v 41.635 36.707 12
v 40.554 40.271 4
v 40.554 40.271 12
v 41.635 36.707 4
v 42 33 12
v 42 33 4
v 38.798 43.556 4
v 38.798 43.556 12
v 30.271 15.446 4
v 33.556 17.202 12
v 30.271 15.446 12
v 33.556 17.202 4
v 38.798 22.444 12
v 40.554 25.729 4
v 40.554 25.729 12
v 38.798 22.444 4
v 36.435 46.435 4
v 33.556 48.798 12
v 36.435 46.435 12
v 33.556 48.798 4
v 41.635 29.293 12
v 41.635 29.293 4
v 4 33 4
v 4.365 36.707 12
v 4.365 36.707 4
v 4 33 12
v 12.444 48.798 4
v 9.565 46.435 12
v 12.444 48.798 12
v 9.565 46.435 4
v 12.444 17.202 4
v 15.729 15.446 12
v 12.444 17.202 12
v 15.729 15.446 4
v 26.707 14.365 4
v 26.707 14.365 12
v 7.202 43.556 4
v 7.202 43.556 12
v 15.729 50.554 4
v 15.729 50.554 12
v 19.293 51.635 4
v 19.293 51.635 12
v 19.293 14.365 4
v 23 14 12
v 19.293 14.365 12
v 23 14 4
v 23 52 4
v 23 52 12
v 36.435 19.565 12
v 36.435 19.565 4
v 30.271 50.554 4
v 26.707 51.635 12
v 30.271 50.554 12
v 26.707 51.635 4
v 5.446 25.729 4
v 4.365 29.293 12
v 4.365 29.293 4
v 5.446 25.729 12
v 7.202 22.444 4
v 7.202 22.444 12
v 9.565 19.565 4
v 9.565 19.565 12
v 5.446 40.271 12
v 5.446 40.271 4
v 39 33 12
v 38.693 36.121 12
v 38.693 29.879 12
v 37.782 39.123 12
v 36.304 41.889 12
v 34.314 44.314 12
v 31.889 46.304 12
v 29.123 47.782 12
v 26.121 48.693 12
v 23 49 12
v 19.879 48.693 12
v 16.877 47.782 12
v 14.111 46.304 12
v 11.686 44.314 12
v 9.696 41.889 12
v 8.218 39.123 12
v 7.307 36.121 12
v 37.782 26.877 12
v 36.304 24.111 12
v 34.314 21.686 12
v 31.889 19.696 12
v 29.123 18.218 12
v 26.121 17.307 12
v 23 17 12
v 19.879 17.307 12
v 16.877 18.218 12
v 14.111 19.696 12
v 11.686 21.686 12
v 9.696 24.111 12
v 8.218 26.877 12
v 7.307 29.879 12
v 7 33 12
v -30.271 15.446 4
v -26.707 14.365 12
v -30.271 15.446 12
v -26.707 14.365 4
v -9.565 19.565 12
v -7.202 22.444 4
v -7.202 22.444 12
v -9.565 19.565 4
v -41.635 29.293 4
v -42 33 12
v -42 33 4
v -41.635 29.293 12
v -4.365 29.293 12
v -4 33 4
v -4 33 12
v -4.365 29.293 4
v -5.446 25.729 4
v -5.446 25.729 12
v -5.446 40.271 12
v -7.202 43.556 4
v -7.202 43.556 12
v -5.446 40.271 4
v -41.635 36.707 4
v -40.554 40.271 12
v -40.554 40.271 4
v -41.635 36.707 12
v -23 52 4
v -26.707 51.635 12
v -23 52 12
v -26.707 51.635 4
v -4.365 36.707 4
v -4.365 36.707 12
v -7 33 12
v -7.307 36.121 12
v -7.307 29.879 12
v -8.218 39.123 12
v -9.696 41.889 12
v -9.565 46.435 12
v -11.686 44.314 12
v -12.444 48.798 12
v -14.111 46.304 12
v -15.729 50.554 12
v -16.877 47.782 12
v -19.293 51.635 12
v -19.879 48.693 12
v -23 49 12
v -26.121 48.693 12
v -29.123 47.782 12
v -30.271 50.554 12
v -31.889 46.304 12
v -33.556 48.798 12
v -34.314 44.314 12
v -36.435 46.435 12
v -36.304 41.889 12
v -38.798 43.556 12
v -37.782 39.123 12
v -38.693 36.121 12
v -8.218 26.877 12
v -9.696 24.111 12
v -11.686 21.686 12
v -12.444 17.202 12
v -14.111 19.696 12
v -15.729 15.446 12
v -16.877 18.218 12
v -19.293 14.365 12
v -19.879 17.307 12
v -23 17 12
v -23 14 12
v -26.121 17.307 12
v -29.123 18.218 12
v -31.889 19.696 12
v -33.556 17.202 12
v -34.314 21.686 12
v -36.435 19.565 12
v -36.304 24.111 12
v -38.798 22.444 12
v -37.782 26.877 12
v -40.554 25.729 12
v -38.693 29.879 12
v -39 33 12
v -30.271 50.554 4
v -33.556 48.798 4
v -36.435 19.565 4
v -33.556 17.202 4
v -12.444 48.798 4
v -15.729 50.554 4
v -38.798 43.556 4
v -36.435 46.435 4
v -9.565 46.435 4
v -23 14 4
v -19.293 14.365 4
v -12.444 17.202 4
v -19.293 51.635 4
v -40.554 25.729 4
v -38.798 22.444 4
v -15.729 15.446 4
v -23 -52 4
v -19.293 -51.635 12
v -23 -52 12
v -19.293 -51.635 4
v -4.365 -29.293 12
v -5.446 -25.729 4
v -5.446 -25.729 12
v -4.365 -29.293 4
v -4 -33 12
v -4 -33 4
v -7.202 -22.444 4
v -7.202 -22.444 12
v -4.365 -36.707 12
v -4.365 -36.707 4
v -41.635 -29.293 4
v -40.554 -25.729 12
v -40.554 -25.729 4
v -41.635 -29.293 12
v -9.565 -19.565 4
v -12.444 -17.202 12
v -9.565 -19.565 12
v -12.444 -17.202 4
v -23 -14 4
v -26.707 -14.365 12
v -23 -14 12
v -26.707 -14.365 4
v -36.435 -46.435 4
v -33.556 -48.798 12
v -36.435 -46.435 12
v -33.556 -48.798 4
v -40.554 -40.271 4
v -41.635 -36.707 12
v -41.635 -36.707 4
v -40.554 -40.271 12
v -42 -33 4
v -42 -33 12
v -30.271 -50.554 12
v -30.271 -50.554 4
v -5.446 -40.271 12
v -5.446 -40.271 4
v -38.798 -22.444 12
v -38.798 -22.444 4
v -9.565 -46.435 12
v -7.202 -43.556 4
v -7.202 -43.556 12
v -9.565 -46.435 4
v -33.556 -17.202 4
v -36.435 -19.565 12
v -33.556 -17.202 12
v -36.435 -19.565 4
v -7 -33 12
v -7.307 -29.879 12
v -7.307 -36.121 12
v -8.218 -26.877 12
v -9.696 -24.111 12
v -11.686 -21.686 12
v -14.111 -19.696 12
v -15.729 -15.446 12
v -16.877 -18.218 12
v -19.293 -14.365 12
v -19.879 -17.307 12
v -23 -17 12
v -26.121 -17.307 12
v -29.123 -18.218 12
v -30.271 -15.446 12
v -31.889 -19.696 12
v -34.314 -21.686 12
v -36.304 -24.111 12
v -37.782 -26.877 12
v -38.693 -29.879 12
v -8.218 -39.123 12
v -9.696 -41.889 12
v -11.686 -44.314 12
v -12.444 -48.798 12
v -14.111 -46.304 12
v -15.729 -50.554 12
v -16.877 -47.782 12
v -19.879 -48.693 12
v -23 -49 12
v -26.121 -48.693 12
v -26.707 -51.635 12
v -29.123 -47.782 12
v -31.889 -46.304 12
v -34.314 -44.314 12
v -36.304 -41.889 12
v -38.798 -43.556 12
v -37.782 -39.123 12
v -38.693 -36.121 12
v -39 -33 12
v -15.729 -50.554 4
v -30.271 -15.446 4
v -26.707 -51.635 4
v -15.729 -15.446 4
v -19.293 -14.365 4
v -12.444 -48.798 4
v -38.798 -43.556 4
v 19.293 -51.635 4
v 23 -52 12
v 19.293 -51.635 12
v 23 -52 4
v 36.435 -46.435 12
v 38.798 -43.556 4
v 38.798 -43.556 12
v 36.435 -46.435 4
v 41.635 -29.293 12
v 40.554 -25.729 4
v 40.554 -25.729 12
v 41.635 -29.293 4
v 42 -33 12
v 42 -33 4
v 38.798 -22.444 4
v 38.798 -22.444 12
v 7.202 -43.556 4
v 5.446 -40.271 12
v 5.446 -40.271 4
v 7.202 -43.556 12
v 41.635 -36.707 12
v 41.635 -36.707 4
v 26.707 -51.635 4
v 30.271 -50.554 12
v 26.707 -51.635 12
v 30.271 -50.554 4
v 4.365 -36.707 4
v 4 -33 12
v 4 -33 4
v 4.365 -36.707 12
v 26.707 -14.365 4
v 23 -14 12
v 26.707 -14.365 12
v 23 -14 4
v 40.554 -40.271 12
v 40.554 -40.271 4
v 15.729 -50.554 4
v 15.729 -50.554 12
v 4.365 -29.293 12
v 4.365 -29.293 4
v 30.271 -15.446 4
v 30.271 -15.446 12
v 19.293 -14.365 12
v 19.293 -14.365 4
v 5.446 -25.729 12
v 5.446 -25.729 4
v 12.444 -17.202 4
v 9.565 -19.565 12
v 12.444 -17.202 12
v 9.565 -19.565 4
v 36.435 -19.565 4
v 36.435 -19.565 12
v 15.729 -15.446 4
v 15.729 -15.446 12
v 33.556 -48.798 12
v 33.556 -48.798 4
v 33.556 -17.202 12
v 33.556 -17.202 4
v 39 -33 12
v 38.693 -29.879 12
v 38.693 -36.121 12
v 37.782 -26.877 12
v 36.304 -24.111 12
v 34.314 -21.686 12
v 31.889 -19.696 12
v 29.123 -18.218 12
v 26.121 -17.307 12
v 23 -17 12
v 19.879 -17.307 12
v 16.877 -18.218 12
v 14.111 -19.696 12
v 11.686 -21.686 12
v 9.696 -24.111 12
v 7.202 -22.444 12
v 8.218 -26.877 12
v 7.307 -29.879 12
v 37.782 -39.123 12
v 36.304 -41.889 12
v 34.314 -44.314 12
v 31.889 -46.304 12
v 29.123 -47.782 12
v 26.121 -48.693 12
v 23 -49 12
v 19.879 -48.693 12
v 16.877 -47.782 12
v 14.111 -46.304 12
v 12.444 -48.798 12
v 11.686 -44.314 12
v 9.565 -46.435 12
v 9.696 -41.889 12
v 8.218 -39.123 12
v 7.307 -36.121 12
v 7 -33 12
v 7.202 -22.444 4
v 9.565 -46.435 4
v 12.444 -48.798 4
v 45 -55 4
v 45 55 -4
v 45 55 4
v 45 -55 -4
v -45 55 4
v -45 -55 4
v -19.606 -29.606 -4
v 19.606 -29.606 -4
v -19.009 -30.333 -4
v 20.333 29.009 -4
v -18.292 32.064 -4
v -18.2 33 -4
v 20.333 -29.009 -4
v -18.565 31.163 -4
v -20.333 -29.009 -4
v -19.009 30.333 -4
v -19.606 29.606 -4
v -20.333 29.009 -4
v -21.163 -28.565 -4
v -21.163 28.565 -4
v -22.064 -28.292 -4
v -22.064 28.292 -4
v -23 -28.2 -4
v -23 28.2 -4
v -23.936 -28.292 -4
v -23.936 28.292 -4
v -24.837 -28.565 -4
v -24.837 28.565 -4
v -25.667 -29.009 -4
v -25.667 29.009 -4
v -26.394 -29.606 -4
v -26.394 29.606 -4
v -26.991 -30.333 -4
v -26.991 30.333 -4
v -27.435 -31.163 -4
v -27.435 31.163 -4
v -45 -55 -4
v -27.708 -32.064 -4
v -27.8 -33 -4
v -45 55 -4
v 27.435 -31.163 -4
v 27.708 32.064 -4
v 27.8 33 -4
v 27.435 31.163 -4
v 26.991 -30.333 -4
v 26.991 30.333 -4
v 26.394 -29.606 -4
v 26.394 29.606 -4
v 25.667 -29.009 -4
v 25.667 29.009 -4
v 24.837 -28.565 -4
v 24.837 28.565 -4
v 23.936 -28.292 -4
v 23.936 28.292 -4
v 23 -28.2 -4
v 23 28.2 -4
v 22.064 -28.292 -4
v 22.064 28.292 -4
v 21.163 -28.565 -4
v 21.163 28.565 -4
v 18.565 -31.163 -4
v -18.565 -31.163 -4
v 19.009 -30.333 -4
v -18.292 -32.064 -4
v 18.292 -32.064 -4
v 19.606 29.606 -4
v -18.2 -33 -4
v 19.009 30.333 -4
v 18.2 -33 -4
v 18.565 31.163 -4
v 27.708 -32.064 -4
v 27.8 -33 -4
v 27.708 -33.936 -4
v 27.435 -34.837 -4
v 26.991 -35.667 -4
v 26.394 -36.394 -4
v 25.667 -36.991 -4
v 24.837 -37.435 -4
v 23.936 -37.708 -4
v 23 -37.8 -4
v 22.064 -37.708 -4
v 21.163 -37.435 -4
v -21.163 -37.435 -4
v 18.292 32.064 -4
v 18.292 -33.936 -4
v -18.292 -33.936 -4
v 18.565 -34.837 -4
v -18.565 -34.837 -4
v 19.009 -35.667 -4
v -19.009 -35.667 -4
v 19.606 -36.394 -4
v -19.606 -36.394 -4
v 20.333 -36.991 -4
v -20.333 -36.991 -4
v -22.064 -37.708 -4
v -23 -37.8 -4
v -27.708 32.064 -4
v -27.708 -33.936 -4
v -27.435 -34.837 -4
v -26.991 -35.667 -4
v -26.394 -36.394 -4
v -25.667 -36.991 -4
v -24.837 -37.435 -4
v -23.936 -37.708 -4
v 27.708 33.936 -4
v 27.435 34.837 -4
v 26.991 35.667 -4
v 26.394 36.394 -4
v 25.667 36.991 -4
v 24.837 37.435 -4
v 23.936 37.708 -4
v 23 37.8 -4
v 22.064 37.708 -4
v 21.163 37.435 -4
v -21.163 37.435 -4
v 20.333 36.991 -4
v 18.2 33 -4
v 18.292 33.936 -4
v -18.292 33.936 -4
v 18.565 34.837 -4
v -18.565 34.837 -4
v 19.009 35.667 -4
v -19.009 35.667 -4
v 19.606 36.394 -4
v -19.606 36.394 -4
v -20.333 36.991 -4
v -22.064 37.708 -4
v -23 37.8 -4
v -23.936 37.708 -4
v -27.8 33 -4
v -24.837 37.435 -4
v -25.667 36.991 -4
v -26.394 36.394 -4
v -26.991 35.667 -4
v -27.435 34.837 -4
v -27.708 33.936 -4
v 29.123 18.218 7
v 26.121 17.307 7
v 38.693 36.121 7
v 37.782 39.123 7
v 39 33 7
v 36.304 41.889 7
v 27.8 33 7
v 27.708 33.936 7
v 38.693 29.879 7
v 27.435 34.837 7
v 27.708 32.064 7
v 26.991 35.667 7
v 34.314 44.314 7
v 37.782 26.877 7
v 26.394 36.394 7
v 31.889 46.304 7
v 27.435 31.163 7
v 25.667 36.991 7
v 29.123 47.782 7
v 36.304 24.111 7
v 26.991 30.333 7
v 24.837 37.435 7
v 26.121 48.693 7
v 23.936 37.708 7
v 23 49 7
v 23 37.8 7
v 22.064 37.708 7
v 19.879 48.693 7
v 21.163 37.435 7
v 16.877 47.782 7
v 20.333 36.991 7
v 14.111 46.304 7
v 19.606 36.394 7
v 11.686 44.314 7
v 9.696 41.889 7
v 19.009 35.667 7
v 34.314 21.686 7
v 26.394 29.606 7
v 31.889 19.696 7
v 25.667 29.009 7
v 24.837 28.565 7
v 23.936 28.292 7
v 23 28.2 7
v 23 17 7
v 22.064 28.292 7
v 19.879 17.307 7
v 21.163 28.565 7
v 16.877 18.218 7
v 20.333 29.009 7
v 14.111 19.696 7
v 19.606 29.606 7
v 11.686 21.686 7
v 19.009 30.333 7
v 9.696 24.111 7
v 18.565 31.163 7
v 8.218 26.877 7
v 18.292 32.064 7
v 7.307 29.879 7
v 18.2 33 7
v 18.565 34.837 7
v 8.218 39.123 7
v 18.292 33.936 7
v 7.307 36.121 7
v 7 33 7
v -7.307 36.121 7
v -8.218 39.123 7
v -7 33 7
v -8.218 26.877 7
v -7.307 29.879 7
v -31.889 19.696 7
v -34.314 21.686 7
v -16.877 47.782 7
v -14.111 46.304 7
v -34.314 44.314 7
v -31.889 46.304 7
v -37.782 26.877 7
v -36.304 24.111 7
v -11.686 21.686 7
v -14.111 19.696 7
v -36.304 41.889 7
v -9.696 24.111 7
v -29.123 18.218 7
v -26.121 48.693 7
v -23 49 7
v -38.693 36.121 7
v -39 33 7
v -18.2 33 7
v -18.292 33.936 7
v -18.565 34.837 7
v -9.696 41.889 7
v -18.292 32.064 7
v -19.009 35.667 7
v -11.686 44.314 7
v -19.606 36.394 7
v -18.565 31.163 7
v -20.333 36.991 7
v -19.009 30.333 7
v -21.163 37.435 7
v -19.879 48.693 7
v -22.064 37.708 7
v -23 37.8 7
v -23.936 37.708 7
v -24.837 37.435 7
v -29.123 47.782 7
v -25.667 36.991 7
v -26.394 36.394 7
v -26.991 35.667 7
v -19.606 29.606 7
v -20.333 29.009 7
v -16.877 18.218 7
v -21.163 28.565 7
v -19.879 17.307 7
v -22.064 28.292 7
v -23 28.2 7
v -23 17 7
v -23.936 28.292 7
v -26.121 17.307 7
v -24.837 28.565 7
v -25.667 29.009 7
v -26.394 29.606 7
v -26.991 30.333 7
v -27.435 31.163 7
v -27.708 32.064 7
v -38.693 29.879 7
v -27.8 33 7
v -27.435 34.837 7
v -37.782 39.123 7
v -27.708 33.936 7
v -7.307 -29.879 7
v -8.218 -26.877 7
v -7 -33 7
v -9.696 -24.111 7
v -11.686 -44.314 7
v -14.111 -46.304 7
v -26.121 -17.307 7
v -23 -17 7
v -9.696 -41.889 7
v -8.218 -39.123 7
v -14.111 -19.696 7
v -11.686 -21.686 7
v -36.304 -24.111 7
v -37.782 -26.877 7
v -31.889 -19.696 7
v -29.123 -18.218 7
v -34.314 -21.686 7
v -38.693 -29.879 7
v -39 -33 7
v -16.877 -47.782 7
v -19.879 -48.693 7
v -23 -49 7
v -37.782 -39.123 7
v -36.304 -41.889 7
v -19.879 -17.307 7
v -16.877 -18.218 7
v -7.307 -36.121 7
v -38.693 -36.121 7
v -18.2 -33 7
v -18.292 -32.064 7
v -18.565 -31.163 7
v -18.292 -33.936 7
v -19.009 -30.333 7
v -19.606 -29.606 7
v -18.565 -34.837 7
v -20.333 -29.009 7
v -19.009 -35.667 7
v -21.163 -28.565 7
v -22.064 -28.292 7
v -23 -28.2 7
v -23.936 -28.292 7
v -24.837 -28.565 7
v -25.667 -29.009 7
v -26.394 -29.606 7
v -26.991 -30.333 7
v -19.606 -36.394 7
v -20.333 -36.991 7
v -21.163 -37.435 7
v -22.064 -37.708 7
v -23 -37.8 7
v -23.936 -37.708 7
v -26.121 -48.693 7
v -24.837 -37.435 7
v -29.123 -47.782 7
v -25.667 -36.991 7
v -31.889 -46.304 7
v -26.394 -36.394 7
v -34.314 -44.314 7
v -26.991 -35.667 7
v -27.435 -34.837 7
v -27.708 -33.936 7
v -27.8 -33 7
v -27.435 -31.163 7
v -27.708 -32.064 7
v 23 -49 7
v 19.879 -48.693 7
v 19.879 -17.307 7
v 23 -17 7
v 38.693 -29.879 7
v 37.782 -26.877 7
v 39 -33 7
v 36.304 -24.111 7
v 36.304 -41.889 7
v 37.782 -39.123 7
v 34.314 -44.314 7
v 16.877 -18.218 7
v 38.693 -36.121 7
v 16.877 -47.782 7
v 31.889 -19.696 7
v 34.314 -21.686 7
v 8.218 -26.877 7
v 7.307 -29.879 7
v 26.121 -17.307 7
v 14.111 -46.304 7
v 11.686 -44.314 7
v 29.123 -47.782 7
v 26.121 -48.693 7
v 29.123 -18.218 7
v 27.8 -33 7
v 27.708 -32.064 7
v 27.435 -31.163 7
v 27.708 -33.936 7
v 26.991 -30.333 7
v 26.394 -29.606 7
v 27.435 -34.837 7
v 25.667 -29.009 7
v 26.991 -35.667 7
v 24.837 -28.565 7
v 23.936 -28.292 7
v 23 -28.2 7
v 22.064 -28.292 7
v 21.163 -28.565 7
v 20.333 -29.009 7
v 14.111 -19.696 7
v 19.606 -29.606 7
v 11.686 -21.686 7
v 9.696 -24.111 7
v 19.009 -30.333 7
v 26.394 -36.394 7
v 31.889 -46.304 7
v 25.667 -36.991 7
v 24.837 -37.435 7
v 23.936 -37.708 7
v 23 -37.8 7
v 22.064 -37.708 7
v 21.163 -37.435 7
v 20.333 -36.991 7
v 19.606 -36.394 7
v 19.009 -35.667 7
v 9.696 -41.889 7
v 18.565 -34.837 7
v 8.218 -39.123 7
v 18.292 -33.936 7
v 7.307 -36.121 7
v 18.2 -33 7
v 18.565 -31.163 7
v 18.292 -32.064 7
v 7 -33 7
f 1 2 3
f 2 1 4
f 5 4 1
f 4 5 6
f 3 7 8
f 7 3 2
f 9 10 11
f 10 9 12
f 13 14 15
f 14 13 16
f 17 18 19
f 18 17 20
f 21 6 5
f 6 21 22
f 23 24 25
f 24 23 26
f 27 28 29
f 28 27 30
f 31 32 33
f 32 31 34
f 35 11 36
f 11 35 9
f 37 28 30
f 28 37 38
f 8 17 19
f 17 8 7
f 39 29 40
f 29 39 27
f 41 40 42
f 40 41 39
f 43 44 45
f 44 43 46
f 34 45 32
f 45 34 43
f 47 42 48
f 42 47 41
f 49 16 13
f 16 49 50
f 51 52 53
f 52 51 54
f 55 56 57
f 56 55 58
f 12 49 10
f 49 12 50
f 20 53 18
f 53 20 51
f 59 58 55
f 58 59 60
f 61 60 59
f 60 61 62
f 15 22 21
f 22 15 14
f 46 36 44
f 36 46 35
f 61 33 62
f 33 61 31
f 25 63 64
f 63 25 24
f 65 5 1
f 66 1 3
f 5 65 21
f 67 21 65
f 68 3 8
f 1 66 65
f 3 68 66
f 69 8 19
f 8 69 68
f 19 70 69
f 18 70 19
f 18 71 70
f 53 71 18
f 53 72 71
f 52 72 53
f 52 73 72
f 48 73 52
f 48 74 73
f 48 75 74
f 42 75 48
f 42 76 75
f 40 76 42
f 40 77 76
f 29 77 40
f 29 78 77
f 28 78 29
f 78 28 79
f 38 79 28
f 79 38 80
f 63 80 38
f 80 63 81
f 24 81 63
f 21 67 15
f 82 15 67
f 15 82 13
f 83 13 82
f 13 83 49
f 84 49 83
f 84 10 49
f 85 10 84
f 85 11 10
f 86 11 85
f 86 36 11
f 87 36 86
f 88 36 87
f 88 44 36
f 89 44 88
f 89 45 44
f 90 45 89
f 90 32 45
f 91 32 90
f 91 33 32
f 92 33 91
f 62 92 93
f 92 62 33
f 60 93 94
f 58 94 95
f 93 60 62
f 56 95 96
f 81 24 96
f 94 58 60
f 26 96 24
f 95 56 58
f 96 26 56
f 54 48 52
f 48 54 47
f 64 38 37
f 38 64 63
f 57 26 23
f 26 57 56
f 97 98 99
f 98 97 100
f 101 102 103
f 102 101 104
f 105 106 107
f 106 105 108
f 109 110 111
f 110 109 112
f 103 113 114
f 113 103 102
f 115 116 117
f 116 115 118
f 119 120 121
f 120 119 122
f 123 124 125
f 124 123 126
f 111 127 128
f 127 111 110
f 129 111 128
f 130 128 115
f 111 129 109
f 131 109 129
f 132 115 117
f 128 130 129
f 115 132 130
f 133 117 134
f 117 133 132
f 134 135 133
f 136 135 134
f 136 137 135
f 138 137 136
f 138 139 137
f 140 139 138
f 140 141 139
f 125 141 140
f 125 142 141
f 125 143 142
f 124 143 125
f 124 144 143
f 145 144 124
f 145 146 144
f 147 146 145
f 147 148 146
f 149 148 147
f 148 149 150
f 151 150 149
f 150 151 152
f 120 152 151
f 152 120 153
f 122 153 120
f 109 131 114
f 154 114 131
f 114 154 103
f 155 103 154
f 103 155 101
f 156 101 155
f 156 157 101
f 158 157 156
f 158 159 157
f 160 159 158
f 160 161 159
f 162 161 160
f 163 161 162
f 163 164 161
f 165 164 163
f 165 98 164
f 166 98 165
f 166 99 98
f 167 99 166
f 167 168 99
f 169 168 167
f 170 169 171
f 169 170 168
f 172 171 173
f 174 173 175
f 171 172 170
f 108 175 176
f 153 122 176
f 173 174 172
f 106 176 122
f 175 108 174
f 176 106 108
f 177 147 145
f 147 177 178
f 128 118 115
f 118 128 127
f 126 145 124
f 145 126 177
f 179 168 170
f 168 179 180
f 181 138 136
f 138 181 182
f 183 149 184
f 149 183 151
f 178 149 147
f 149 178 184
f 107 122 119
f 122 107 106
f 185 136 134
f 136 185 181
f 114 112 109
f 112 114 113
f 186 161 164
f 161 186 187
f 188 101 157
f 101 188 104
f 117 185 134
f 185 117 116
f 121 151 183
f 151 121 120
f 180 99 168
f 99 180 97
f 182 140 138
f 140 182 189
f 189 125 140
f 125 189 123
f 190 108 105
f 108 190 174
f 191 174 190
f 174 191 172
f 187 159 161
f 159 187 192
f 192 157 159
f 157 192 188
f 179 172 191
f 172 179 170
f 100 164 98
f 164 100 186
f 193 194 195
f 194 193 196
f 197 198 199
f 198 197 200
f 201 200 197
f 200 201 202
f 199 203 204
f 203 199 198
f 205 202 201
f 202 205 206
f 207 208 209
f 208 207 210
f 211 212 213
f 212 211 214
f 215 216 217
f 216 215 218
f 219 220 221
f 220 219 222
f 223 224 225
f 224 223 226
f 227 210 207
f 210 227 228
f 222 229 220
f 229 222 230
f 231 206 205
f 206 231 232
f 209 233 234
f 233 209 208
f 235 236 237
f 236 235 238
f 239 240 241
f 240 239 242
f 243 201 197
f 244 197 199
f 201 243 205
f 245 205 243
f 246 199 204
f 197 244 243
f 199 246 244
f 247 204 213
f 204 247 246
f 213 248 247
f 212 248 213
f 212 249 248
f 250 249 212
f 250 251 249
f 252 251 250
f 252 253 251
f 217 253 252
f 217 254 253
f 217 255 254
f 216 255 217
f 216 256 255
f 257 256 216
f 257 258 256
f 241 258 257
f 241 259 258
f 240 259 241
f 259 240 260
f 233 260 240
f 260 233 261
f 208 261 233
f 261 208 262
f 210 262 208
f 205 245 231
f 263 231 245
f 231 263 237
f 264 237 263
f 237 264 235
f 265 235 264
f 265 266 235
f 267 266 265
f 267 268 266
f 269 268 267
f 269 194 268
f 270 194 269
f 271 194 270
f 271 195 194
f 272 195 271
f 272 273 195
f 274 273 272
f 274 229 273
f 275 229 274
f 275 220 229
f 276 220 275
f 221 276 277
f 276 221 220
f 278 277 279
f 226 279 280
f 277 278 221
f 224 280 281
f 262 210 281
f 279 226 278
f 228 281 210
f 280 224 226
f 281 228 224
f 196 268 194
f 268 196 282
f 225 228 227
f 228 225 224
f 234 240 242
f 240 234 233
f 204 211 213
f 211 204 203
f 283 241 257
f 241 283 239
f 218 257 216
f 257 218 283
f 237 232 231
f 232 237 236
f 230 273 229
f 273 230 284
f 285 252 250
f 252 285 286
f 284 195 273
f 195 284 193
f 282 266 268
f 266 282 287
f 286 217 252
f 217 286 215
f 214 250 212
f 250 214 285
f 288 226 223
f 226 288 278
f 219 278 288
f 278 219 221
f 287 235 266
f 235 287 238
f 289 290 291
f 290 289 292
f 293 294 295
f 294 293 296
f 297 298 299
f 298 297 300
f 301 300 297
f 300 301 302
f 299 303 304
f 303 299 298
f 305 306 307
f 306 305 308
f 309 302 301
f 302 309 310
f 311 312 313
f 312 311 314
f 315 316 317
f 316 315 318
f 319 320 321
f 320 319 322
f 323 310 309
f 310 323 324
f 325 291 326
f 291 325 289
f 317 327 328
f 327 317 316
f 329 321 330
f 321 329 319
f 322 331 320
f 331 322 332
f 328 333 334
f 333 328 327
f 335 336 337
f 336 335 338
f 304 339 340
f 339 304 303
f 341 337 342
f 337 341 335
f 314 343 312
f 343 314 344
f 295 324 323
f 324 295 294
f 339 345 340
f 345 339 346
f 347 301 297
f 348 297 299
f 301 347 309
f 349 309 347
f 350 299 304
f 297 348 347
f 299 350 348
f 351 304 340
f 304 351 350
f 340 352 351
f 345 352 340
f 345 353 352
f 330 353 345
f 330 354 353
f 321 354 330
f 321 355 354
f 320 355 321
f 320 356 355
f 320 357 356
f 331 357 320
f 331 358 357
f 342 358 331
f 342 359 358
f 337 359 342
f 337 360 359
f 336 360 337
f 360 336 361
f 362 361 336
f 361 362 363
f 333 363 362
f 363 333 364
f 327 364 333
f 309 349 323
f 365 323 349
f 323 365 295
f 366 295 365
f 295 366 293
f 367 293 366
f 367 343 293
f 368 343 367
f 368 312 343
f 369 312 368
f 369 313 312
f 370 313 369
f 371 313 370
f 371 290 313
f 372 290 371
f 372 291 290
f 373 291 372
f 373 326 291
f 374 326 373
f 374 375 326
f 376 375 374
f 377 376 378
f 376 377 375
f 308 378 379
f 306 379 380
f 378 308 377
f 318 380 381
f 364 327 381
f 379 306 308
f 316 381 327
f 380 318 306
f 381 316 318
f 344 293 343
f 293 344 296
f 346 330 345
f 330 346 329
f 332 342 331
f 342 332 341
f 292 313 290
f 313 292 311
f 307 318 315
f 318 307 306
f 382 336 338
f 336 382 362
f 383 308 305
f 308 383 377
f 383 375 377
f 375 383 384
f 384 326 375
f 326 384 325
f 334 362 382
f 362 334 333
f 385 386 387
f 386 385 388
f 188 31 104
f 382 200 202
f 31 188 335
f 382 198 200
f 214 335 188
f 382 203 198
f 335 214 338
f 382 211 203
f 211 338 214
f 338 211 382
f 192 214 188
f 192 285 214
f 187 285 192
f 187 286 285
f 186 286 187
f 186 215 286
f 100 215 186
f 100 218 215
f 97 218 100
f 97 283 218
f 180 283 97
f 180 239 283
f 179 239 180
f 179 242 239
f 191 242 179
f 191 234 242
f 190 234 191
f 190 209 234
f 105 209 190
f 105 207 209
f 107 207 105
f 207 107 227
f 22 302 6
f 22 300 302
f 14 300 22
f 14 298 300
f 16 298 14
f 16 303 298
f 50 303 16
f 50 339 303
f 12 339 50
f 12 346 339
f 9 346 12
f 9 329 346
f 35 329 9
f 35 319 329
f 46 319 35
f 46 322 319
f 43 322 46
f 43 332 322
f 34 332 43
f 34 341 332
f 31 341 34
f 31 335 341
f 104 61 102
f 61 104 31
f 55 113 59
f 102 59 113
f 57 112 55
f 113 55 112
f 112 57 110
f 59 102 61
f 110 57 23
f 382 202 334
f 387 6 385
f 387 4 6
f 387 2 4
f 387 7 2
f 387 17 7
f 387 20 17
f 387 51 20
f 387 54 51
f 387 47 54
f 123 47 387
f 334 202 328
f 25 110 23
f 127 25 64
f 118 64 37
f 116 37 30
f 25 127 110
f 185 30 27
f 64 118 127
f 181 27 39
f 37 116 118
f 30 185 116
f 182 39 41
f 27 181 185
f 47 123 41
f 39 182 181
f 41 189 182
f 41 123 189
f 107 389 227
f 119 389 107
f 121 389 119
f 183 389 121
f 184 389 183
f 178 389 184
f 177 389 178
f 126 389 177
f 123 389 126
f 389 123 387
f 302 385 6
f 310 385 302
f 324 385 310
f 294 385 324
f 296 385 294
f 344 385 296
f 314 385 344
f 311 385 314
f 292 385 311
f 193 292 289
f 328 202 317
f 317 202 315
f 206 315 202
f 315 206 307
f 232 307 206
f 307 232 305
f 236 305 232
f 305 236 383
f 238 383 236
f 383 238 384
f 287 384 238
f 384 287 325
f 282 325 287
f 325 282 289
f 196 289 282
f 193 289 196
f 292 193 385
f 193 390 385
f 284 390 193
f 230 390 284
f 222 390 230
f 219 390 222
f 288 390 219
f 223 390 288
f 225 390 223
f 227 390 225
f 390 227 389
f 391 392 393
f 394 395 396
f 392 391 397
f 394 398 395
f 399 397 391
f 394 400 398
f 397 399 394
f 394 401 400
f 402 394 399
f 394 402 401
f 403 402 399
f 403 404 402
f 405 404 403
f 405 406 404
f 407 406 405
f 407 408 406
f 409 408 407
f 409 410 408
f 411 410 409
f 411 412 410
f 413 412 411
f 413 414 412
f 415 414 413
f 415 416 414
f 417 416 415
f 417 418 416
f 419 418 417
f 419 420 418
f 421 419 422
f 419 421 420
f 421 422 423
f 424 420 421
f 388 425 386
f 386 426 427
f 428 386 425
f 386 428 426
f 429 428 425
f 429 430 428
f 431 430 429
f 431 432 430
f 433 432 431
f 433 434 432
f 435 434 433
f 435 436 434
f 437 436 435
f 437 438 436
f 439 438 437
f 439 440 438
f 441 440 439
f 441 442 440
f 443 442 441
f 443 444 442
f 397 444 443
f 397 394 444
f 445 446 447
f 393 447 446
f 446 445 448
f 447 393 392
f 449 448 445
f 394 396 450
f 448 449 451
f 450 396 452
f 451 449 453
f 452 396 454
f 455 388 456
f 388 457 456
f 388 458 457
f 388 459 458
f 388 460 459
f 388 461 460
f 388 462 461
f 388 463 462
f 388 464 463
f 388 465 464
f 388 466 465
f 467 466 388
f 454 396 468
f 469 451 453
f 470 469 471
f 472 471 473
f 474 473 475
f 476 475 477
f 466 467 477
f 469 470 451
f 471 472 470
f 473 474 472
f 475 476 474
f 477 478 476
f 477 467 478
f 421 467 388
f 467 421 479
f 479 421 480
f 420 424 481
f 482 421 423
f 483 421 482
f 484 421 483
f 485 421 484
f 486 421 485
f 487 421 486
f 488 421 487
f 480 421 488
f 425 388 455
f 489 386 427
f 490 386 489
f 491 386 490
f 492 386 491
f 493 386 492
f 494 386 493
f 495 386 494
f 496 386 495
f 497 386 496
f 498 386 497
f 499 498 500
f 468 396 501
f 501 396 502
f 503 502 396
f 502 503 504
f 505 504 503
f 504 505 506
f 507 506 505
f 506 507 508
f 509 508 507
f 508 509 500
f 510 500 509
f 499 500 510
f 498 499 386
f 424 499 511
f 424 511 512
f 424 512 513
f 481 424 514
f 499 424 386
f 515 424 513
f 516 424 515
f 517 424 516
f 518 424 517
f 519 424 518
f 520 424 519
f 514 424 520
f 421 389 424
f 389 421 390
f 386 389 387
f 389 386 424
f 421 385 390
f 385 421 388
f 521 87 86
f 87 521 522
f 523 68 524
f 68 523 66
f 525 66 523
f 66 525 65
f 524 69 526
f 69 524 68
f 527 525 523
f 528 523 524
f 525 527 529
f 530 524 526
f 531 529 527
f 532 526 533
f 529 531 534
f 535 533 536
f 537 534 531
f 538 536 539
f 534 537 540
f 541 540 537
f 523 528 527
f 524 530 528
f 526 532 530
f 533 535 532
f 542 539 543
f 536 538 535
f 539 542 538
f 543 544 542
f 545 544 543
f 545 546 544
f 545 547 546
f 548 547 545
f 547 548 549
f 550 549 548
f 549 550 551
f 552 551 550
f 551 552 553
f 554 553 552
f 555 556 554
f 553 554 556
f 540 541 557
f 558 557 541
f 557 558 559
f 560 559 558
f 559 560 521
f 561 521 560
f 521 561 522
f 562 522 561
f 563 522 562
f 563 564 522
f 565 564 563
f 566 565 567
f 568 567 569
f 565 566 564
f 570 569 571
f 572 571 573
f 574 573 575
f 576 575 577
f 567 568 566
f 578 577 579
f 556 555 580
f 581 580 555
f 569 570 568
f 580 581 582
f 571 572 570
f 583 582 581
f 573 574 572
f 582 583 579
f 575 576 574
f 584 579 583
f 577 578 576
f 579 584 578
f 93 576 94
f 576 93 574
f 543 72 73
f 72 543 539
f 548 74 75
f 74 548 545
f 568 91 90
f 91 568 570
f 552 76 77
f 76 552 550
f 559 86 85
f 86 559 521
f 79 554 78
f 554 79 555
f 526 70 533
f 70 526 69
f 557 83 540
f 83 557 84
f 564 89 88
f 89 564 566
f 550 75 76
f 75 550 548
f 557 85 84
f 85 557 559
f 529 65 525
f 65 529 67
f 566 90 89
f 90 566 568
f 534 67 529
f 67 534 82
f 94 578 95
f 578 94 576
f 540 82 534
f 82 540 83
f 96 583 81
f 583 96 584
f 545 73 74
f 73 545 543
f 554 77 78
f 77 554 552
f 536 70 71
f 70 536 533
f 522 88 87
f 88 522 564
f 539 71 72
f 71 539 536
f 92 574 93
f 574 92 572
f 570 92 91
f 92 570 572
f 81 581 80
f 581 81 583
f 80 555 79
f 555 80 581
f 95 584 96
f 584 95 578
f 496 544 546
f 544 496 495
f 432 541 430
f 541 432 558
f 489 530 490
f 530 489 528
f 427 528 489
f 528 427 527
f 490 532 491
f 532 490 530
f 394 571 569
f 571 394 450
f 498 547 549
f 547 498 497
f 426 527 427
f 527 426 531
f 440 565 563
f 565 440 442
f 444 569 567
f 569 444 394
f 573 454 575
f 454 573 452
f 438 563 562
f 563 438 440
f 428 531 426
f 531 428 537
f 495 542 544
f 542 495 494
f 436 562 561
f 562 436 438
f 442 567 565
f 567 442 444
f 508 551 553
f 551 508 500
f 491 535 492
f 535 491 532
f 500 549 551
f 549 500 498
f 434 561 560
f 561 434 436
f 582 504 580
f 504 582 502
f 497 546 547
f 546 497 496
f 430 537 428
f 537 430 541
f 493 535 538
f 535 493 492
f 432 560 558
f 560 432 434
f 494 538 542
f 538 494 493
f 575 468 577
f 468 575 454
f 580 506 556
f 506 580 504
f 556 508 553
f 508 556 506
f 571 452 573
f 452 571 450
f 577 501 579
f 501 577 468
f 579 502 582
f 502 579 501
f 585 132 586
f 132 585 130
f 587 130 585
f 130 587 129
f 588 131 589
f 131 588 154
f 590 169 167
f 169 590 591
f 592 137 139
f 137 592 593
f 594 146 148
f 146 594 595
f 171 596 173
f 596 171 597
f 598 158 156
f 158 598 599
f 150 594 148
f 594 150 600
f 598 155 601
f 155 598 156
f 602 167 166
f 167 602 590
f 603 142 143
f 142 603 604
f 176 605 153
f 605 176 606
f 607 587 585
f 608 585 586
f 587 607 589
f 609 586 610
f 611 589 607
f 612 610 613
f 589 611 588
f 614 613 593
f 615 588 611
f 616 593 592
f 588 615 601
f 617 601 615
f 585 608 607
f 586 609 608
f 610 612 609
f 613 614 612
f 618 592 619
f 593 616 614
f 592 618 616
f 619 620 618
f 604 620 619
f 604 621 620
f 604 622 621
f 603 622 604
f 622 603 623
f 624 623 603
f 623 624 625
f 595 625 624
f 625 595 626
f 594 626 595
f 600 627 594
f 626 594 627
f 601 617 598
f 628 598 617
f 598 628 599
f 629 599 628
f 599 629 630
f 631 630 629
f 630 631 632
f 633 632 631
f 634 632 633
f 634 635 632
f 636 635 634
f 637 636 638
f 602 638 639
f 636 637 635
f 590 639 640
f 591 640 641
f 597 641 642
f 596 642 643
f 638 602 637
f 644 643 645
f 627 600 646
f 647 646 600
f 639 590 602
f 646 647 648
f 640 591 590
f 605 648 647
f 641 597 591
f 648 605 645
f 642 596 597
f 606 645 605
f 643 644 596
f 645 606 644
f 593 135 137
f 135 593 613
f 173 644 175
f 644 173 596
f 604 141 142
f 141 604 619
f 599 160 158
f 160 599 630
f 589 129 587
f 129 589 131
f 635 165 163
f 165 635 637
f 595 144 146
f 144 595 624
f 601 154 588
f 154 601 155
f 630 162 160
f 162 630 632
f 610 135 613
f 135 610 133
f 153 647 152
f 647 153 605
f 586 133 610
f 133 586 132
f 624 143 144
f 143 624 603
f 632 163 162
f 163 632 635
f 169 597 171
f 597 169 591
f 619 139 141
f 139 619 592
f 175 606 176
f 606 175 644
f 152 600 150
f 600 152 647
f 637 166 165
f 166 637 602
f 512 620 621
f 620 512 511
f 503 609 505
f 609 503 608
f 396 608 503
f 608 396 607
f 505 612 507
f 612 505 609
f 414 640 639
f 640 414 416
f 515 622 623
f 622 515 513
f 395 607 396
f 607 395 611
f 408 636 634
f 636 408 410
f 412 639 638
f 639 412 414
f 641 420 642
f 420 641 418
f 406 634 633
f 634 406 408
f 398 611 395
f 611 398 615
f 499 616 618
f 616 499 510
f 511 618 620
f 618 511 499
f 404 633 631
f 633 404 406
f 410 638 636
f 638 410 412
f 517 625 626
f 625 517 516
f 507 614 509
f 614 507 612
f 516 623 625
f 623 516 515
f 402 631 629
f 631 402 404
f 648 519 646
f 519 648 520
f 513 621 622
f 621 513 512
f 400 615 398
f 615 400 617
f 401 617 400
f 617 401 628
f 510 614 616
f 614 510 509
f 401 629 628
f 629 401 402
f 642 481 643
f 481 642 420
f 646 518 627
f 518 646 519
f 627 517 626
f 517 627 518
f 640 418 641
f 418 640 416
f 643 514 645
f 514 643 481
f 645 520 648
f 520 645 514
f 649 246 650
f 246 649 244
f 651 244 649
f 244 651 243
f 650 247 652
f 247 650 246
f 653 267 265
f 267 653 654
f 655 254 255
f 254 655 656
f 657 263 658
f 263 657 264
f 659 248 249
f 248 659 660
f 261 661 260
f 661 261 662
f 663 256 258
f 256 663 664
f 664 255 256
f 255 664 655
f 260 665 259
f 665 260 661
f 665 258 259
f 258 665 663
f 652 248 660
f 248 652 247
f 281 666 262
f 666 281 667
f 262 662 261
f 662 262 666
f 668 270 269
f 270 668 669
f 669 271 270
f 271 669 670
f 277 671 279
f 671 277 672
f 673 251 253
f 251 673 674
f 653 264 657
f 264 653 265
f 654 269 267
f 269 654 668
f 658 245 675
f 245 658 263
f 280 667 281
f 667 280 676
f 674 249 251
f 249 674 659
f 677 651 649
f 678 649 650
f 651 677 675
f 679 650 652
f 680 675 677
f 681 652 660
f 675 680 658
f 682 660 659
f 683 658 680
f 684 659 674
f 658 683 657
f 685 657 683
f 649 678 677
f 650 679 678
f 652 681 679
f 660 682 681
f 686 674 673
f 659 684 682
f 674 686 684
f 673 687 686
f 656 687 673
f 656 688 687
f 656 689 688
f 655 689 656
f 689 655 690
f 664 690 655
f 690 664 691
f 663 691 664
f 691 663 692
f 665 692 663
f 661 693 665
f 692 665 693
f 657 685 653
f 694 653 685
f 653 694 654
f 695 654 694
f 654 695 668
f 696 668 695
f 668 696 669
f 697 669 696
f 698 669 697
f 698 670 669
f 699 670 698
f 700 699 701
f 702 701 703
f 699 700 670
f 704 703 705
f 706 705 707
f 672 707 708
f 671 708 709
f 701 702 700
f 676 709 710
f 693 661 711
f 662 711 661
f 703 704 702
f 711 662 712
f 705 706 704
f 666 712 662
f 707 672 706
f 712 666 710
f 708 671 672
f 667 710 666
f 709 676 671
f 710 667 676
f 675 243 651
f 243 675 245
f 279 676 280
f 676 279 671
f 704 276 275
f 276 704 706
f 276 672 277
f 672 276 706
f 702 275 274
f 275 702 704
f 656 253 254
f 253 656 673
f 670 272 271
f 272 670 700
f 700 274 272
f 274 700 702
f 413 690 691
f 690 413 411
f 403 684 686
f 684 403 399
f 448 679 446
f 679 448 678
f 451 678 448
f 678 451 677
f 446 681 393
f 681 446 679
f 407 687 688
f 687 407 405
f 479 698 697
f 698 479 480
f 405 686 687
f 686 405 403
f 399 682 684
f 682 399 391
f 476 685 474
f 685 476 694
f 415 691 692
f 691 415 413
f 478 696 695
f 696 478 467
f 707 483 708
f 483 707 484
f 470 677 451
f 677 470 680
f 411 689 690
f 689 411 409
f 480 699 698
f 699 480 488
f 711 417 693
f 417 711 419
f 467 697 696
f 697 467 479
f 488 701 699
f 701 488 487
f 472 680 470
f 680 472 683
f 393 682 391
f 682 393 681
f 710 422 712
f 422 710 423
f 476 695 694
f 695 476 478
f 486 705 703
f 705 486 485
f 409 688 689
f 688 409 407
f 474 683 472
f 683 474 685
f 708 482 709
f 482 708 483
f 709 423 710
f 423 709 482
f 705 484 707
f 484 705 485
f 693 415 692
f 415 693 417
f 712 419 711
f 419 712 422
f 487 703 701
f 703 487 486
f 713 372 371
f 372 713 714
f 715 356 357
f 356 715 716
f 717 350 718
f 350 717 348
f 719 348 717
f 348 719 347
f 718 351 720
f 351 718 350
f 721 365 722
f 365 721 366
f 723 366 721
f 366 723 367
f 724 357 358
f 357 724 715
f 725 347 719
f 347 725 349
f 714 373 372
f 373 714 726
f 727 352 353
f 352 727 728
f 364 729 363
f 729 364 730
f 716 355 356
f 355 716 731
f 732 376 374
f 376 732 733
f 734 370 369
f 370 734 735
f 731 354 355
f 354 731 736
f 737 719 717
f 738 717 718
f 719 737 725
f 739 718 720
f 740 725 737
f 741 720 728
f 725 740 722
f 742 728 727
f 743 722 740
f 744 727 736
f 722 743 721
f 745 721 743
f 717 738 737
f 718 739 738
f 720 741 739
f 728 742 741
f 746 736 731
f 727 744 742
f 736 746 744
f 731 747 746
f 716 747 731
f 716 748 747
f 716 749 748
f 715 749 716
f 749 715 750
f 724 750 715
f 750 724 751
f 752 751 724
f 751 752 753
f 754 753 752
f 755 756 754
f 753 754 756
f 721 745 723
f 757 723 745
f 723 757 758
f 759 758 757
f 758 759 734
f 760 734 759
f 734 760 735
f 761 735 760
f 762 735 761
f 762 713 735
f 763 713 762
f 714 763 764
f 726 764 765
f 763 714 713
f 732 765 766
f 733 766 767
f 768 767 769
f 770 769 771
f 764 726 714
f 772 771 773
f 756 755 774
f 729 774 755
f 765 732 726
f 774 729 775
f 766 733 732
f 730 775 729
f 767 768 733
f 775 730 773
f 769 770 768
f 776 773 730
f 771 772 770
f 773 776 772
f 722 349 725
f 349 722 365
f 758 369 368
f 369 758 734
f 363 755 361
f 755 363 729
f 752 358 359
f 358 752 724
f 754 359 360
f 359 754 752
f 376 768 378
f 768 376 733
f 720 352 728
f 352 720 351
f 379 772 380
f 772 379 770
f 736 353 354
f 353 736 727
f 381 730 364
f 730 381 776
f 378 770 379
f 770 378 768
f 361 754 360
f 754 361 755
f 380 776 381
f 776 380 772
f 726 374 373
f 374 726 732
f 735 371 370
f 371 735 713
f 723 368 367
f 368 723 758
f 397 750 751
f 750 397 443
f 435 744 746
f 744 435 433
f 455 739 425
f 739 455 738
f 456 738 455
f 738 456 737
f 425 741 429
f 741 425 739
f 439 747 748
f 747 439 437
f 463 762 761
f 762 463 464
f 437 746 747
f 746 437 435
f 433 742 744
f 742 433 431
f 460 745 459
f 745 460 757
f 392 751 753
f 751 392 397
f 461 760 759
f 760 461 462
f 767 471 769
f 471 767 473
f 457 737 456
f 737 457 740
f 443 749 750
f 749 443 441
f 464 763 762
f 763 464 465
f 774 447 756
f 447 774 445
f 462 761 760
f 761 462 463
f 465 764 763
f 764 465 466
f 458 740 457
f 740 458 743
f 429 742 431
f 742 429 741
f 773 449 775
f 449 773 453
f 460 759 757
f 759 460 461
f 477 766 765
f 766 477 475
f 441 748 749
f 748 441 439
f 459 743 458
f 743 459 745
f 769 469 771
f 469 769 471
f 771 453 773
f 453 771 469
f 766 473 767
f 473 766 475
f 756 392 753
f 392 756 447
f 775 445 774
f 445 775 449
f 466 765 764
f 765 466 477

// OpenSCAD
$fn = 32;

// ----------------------------------------------------------------------
// Socket pad plate
// bosses with counterbored sockets for the screws
// ----------------------------------------------------------------------

// --- parameters (mm) ---
base_t = 8;            // base plate thickness
boss_h = 8;            // boss height above the base plate
boss_d = 38;           // boss diameter
socket_d = 32;         // socket diameter
socket_depth = 5;      // socket depth from the boss face
bolt_d = 9.6;          // screw clearance hole through the socket floor
plate = [90, 110, 8];  // overall size (x, y, z)
edge = 22;             // boss centre offset from the plate edge
pads = 4;              // boss count, one per corner

// --- derived feature positions (mm) ---
height = base_t + boss_h;        // = 16   overall height of the part
corner_x = plate[0] / 2 - edge;  // = 23   boss centre X
corner_y = plate[1] / 2 - edge;  // = 33   boss centre Y
feature_centers = [
  [corner_x, corner_y],
  [-corner_x, corner_y],
  [-corner_x, -corner_y],
  [corner_x, -corner_y]
];   // boss centres: sockets, holes and the pads themselves are placed from here

// base plate, bosses on feature_centers, socket + through hole in each
difference() {
  union() {
    cube(plate, center = true);
    for (centre = feature_centers)
      translate([centre[0], centre[1], plate[2] / 2 - 1])
        cylinder(d = boss_d, h = boss_h + 1);
  }
  for (centre = feature_centers) {
    translate([centre[0], centre[1], plate[2] / 2 + boss_h - socket_depth])
      cylinder(d = socket_d, h = socket_depth + 1);
    translate([centre[0], centre[1], -height])
      cylinder(d = bolt_d, h = 2 * height + 2);  // through the socket floor
  }
}
